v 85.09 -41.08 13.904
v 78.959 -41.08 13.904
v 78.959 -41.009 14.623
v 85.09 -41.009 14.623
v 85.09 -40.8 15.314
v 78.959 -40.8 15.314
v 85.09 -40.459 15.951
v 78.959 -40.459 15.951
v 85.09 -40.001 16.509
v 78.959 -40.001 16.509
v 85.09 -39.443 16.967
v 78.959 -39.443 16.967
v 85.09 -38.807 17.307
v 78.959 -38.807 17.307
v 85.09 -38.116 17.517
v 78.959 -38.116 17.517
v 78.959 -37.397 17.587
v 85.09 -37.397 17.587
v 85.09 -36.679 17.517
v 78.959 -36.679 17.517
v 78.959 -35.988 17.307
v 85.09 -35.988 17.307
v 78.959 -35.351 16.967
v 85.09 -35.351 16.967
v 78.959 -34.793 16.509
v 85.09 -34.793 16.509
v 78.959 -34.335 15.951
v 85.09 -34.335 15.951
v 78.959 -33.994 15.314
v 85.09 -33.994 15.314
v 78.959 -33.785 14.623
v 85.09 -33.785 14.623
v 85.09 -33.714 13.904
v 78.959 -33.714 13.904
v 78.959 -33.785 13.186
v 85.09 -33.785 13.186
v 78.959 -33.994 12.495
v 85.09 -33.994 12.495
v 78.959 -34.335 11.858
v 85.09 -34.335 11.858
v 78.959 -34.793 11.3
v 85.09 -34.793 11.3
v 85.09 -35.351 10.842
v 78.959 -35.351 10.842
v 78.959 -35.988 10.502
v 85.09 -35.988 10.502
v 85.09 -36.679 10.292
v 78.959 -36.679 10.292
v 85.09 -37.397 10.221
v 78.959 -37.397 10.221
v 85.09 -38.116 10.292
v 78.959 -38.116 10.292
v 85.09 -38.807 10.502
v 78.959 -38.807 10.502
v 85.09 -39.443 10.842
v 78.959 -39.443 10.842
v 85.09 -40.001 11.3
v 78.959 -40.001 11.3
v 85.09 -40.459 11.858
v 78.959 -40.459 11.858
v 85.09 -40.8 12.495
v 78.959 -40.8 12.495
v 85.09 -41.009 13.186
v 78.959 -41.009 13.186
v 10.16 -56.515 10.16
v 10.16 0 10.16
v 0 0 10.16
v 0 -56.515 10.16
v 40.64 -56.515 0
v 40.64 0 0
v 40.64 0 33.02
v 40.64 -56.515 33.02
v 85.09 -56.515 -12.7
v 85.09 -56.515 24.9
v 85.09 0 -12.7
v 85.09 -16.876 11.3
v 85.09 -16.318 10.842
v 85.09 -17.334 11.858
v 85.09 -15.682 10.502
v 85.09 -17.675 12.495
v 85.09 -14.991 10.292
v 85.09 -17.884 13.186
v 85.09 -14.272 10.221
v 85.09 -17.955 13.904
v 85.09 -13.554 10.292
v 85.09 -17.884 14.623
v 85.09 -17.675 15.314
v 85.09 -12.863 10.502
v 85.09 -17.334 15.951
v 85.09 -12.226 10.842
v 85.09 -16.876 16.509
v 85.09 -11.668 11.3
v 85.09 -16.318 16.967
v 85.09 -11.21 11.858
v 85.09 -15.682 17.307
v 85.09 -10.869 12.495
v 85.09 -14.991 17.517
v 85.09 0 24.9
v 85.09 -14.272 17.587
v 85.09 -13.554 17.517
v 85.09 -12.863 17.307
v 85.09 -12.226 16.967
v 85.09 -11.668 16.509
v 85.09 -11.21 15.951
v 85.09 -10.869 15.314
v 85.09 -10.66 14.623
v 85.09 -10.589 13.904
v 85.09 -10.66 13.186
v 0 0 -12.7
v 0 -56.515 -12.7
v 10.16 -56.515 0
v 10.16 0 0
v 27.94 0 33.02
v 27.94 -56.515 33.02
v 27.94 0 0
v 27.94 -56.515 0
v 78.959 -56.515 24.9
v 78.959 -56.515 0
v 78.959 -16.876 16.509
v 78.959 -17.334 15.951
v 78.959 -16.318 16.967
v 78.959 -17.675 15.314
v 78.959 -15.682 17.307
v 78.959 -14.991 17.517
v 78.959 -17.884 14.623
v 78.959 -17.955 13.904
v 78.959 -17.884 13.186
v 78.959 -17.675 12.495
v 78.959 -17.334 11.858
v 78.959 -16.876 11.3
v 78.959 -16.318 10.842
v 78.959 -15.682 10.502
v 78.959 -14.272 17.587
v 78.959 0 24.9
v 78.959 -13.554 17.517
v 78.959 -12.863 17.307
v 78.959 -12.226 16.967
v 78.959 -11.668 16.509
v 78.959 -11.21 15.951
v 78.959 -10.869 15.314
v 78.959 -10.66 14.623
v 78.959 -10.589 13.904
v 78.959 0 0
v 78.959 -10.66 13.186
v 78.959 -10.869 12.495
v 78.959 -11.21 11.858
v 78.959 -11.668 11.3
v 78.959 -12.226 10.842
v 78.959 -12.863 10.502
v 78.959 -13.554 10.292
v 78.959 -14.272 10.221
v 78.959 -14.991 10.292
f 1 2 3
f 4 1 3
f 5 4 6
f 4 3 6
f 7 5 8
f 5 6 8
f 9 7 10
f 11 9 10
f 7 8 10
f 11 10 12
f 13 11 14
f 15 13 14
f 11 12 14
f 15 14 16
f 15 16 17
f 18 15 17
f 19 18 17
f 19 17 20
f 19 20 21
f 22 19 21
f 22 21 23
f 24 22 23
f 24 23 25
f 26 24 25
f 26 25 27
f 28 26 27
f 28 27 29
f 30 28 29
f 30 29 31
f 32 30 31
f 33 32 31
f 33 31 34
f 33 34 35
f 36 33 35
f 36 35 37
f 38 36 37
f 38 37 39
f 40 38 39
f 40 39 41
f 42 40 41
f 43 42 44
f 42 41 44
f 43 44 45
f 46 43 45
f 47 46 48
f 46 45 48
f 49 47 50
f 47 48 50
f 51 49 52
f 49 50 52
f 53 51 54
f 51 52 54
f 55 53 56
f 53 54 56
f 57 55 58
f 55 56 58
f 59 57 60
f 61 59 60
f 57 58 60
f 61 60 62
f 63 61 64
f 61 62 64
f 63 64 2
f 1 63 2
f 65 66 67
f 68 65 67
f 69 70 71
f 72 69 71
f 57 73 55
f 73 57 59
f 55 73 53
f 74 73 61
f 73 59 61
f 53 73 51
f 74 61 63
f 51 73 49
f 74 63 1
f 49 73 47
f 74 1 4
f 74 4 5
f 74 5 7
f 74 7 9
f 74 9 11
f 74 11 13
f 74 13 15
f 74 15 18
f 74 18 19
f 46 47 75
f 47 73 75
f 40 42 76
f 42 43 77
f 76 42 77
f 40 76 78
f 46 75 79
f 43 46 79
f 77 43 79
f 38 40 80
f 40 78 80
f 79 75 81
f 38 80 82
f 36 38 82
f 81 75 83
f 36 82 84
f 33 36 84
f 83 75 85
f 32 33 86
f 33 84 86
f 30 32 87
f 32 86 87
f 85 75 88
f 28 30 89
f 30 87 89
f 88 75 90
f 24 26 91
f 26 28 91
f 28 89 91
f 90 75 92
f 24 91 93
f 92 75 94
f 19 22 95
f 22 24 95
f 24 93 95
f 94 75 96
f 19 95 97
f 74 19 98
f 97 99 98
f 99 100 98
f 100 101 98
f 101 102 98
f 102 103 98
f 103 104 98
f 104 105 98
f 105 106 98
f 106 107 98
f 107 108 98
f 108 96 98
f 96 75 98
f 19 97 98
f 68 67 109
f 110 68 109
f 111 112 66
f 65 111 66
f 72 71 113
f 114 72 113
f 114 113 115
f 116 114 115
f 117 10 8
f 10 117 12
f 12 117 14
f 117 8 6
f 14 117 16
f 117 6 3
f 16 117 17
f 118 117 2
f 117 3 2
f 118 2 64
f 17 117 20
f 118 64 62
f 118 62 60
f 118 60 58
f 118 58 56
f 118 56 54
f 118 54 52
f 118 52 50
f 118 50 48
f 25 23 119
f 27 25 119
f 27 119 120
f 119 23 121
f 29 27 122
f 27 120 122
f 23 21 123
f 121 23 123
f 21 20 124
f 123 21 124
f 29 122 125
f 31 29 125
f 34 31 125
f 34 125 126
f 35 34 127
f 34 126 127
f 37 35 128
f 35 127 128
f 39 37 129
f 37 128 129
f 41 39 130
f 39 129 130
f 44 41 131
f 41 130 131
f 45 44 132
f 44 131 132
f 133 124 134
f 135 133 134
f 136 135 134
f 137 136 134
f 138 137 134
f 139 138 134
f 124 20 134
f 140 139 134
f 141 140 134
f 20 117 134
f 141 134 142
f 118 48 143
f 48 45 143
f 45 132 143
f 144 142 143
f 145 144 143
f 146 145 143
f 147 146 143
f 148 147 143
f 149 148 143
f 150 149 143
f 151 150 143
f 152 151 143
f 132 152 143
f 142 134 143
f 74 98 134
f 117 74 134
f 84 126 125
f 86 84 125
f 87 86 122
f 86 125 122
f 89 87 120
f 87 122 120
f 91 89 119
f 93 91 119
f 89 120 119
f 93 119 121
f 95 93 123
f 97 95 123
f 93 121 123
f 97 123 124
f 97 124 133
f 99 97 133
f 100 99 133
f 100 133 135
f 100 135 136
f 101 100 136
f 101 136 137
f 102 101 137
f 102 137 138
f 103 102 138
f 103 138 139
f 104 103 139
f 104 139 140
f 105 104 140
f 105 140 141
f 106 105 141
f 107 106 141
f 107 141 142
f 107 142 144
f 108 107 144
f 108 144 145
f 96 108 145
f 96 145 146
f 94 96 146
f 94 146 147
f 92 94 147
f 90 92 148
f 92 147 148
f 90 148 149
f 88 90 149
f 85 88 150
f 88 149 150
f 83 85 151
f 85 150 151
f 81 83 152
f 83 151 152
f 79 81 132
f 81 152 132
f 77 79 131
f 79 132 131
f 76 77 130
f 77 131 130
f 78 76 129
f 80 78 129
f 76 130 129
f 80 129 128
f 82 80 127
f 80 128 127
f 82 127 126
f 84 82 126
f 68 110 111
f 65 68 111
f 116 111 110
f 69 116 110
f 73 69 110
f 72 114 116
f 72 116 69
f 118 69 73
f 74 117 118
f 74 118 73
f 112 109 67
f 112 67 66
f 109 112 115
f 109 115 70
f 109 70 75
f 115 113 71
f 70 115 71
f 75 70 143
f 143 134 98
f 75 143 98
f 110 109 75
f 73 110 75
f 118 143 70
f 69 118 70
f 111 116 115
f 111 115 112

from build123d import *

# Parameters (mm, degrees)
F1_DEPTH = 56.515
F3_D     = 7.366
F3_DEPTH = 10.16
F4_D     = 7.366
F4_DEPTH = 10.16


with BuildPart() as f1:
    # F0 (on Front) → F1 (new body)
    with BuildSketch(Plane.XZ):
        Polygon((27.94, 0), (10.16, 0), (10.16, 10.16), (0, 10.16), (0, 0), (0, -12.7), (85.09, -12.7), (85.09, 0), (85.09, 24.900328), (78.959122, 24.900328), (78.959122, 0), (40.64, 0), (40.64, 33.02), (27.94, 33.02), align=None)
    extrude(amount=F1_DEPTH)

    # F3
    with Locations(Plane.YZ.offset(85.09)):
        with Locations((-37.39713, 13.904383)):
            Hole(F3_D / 2, depth=F3_DEPTH)

    # F4
    with Locations(Plane.YZ.offset(85.09)):
        with Locations((-14.272088, 13.904383)):
            Hole(F4_D / 2, depth=F4_DEPTH)


solid = f1.part
